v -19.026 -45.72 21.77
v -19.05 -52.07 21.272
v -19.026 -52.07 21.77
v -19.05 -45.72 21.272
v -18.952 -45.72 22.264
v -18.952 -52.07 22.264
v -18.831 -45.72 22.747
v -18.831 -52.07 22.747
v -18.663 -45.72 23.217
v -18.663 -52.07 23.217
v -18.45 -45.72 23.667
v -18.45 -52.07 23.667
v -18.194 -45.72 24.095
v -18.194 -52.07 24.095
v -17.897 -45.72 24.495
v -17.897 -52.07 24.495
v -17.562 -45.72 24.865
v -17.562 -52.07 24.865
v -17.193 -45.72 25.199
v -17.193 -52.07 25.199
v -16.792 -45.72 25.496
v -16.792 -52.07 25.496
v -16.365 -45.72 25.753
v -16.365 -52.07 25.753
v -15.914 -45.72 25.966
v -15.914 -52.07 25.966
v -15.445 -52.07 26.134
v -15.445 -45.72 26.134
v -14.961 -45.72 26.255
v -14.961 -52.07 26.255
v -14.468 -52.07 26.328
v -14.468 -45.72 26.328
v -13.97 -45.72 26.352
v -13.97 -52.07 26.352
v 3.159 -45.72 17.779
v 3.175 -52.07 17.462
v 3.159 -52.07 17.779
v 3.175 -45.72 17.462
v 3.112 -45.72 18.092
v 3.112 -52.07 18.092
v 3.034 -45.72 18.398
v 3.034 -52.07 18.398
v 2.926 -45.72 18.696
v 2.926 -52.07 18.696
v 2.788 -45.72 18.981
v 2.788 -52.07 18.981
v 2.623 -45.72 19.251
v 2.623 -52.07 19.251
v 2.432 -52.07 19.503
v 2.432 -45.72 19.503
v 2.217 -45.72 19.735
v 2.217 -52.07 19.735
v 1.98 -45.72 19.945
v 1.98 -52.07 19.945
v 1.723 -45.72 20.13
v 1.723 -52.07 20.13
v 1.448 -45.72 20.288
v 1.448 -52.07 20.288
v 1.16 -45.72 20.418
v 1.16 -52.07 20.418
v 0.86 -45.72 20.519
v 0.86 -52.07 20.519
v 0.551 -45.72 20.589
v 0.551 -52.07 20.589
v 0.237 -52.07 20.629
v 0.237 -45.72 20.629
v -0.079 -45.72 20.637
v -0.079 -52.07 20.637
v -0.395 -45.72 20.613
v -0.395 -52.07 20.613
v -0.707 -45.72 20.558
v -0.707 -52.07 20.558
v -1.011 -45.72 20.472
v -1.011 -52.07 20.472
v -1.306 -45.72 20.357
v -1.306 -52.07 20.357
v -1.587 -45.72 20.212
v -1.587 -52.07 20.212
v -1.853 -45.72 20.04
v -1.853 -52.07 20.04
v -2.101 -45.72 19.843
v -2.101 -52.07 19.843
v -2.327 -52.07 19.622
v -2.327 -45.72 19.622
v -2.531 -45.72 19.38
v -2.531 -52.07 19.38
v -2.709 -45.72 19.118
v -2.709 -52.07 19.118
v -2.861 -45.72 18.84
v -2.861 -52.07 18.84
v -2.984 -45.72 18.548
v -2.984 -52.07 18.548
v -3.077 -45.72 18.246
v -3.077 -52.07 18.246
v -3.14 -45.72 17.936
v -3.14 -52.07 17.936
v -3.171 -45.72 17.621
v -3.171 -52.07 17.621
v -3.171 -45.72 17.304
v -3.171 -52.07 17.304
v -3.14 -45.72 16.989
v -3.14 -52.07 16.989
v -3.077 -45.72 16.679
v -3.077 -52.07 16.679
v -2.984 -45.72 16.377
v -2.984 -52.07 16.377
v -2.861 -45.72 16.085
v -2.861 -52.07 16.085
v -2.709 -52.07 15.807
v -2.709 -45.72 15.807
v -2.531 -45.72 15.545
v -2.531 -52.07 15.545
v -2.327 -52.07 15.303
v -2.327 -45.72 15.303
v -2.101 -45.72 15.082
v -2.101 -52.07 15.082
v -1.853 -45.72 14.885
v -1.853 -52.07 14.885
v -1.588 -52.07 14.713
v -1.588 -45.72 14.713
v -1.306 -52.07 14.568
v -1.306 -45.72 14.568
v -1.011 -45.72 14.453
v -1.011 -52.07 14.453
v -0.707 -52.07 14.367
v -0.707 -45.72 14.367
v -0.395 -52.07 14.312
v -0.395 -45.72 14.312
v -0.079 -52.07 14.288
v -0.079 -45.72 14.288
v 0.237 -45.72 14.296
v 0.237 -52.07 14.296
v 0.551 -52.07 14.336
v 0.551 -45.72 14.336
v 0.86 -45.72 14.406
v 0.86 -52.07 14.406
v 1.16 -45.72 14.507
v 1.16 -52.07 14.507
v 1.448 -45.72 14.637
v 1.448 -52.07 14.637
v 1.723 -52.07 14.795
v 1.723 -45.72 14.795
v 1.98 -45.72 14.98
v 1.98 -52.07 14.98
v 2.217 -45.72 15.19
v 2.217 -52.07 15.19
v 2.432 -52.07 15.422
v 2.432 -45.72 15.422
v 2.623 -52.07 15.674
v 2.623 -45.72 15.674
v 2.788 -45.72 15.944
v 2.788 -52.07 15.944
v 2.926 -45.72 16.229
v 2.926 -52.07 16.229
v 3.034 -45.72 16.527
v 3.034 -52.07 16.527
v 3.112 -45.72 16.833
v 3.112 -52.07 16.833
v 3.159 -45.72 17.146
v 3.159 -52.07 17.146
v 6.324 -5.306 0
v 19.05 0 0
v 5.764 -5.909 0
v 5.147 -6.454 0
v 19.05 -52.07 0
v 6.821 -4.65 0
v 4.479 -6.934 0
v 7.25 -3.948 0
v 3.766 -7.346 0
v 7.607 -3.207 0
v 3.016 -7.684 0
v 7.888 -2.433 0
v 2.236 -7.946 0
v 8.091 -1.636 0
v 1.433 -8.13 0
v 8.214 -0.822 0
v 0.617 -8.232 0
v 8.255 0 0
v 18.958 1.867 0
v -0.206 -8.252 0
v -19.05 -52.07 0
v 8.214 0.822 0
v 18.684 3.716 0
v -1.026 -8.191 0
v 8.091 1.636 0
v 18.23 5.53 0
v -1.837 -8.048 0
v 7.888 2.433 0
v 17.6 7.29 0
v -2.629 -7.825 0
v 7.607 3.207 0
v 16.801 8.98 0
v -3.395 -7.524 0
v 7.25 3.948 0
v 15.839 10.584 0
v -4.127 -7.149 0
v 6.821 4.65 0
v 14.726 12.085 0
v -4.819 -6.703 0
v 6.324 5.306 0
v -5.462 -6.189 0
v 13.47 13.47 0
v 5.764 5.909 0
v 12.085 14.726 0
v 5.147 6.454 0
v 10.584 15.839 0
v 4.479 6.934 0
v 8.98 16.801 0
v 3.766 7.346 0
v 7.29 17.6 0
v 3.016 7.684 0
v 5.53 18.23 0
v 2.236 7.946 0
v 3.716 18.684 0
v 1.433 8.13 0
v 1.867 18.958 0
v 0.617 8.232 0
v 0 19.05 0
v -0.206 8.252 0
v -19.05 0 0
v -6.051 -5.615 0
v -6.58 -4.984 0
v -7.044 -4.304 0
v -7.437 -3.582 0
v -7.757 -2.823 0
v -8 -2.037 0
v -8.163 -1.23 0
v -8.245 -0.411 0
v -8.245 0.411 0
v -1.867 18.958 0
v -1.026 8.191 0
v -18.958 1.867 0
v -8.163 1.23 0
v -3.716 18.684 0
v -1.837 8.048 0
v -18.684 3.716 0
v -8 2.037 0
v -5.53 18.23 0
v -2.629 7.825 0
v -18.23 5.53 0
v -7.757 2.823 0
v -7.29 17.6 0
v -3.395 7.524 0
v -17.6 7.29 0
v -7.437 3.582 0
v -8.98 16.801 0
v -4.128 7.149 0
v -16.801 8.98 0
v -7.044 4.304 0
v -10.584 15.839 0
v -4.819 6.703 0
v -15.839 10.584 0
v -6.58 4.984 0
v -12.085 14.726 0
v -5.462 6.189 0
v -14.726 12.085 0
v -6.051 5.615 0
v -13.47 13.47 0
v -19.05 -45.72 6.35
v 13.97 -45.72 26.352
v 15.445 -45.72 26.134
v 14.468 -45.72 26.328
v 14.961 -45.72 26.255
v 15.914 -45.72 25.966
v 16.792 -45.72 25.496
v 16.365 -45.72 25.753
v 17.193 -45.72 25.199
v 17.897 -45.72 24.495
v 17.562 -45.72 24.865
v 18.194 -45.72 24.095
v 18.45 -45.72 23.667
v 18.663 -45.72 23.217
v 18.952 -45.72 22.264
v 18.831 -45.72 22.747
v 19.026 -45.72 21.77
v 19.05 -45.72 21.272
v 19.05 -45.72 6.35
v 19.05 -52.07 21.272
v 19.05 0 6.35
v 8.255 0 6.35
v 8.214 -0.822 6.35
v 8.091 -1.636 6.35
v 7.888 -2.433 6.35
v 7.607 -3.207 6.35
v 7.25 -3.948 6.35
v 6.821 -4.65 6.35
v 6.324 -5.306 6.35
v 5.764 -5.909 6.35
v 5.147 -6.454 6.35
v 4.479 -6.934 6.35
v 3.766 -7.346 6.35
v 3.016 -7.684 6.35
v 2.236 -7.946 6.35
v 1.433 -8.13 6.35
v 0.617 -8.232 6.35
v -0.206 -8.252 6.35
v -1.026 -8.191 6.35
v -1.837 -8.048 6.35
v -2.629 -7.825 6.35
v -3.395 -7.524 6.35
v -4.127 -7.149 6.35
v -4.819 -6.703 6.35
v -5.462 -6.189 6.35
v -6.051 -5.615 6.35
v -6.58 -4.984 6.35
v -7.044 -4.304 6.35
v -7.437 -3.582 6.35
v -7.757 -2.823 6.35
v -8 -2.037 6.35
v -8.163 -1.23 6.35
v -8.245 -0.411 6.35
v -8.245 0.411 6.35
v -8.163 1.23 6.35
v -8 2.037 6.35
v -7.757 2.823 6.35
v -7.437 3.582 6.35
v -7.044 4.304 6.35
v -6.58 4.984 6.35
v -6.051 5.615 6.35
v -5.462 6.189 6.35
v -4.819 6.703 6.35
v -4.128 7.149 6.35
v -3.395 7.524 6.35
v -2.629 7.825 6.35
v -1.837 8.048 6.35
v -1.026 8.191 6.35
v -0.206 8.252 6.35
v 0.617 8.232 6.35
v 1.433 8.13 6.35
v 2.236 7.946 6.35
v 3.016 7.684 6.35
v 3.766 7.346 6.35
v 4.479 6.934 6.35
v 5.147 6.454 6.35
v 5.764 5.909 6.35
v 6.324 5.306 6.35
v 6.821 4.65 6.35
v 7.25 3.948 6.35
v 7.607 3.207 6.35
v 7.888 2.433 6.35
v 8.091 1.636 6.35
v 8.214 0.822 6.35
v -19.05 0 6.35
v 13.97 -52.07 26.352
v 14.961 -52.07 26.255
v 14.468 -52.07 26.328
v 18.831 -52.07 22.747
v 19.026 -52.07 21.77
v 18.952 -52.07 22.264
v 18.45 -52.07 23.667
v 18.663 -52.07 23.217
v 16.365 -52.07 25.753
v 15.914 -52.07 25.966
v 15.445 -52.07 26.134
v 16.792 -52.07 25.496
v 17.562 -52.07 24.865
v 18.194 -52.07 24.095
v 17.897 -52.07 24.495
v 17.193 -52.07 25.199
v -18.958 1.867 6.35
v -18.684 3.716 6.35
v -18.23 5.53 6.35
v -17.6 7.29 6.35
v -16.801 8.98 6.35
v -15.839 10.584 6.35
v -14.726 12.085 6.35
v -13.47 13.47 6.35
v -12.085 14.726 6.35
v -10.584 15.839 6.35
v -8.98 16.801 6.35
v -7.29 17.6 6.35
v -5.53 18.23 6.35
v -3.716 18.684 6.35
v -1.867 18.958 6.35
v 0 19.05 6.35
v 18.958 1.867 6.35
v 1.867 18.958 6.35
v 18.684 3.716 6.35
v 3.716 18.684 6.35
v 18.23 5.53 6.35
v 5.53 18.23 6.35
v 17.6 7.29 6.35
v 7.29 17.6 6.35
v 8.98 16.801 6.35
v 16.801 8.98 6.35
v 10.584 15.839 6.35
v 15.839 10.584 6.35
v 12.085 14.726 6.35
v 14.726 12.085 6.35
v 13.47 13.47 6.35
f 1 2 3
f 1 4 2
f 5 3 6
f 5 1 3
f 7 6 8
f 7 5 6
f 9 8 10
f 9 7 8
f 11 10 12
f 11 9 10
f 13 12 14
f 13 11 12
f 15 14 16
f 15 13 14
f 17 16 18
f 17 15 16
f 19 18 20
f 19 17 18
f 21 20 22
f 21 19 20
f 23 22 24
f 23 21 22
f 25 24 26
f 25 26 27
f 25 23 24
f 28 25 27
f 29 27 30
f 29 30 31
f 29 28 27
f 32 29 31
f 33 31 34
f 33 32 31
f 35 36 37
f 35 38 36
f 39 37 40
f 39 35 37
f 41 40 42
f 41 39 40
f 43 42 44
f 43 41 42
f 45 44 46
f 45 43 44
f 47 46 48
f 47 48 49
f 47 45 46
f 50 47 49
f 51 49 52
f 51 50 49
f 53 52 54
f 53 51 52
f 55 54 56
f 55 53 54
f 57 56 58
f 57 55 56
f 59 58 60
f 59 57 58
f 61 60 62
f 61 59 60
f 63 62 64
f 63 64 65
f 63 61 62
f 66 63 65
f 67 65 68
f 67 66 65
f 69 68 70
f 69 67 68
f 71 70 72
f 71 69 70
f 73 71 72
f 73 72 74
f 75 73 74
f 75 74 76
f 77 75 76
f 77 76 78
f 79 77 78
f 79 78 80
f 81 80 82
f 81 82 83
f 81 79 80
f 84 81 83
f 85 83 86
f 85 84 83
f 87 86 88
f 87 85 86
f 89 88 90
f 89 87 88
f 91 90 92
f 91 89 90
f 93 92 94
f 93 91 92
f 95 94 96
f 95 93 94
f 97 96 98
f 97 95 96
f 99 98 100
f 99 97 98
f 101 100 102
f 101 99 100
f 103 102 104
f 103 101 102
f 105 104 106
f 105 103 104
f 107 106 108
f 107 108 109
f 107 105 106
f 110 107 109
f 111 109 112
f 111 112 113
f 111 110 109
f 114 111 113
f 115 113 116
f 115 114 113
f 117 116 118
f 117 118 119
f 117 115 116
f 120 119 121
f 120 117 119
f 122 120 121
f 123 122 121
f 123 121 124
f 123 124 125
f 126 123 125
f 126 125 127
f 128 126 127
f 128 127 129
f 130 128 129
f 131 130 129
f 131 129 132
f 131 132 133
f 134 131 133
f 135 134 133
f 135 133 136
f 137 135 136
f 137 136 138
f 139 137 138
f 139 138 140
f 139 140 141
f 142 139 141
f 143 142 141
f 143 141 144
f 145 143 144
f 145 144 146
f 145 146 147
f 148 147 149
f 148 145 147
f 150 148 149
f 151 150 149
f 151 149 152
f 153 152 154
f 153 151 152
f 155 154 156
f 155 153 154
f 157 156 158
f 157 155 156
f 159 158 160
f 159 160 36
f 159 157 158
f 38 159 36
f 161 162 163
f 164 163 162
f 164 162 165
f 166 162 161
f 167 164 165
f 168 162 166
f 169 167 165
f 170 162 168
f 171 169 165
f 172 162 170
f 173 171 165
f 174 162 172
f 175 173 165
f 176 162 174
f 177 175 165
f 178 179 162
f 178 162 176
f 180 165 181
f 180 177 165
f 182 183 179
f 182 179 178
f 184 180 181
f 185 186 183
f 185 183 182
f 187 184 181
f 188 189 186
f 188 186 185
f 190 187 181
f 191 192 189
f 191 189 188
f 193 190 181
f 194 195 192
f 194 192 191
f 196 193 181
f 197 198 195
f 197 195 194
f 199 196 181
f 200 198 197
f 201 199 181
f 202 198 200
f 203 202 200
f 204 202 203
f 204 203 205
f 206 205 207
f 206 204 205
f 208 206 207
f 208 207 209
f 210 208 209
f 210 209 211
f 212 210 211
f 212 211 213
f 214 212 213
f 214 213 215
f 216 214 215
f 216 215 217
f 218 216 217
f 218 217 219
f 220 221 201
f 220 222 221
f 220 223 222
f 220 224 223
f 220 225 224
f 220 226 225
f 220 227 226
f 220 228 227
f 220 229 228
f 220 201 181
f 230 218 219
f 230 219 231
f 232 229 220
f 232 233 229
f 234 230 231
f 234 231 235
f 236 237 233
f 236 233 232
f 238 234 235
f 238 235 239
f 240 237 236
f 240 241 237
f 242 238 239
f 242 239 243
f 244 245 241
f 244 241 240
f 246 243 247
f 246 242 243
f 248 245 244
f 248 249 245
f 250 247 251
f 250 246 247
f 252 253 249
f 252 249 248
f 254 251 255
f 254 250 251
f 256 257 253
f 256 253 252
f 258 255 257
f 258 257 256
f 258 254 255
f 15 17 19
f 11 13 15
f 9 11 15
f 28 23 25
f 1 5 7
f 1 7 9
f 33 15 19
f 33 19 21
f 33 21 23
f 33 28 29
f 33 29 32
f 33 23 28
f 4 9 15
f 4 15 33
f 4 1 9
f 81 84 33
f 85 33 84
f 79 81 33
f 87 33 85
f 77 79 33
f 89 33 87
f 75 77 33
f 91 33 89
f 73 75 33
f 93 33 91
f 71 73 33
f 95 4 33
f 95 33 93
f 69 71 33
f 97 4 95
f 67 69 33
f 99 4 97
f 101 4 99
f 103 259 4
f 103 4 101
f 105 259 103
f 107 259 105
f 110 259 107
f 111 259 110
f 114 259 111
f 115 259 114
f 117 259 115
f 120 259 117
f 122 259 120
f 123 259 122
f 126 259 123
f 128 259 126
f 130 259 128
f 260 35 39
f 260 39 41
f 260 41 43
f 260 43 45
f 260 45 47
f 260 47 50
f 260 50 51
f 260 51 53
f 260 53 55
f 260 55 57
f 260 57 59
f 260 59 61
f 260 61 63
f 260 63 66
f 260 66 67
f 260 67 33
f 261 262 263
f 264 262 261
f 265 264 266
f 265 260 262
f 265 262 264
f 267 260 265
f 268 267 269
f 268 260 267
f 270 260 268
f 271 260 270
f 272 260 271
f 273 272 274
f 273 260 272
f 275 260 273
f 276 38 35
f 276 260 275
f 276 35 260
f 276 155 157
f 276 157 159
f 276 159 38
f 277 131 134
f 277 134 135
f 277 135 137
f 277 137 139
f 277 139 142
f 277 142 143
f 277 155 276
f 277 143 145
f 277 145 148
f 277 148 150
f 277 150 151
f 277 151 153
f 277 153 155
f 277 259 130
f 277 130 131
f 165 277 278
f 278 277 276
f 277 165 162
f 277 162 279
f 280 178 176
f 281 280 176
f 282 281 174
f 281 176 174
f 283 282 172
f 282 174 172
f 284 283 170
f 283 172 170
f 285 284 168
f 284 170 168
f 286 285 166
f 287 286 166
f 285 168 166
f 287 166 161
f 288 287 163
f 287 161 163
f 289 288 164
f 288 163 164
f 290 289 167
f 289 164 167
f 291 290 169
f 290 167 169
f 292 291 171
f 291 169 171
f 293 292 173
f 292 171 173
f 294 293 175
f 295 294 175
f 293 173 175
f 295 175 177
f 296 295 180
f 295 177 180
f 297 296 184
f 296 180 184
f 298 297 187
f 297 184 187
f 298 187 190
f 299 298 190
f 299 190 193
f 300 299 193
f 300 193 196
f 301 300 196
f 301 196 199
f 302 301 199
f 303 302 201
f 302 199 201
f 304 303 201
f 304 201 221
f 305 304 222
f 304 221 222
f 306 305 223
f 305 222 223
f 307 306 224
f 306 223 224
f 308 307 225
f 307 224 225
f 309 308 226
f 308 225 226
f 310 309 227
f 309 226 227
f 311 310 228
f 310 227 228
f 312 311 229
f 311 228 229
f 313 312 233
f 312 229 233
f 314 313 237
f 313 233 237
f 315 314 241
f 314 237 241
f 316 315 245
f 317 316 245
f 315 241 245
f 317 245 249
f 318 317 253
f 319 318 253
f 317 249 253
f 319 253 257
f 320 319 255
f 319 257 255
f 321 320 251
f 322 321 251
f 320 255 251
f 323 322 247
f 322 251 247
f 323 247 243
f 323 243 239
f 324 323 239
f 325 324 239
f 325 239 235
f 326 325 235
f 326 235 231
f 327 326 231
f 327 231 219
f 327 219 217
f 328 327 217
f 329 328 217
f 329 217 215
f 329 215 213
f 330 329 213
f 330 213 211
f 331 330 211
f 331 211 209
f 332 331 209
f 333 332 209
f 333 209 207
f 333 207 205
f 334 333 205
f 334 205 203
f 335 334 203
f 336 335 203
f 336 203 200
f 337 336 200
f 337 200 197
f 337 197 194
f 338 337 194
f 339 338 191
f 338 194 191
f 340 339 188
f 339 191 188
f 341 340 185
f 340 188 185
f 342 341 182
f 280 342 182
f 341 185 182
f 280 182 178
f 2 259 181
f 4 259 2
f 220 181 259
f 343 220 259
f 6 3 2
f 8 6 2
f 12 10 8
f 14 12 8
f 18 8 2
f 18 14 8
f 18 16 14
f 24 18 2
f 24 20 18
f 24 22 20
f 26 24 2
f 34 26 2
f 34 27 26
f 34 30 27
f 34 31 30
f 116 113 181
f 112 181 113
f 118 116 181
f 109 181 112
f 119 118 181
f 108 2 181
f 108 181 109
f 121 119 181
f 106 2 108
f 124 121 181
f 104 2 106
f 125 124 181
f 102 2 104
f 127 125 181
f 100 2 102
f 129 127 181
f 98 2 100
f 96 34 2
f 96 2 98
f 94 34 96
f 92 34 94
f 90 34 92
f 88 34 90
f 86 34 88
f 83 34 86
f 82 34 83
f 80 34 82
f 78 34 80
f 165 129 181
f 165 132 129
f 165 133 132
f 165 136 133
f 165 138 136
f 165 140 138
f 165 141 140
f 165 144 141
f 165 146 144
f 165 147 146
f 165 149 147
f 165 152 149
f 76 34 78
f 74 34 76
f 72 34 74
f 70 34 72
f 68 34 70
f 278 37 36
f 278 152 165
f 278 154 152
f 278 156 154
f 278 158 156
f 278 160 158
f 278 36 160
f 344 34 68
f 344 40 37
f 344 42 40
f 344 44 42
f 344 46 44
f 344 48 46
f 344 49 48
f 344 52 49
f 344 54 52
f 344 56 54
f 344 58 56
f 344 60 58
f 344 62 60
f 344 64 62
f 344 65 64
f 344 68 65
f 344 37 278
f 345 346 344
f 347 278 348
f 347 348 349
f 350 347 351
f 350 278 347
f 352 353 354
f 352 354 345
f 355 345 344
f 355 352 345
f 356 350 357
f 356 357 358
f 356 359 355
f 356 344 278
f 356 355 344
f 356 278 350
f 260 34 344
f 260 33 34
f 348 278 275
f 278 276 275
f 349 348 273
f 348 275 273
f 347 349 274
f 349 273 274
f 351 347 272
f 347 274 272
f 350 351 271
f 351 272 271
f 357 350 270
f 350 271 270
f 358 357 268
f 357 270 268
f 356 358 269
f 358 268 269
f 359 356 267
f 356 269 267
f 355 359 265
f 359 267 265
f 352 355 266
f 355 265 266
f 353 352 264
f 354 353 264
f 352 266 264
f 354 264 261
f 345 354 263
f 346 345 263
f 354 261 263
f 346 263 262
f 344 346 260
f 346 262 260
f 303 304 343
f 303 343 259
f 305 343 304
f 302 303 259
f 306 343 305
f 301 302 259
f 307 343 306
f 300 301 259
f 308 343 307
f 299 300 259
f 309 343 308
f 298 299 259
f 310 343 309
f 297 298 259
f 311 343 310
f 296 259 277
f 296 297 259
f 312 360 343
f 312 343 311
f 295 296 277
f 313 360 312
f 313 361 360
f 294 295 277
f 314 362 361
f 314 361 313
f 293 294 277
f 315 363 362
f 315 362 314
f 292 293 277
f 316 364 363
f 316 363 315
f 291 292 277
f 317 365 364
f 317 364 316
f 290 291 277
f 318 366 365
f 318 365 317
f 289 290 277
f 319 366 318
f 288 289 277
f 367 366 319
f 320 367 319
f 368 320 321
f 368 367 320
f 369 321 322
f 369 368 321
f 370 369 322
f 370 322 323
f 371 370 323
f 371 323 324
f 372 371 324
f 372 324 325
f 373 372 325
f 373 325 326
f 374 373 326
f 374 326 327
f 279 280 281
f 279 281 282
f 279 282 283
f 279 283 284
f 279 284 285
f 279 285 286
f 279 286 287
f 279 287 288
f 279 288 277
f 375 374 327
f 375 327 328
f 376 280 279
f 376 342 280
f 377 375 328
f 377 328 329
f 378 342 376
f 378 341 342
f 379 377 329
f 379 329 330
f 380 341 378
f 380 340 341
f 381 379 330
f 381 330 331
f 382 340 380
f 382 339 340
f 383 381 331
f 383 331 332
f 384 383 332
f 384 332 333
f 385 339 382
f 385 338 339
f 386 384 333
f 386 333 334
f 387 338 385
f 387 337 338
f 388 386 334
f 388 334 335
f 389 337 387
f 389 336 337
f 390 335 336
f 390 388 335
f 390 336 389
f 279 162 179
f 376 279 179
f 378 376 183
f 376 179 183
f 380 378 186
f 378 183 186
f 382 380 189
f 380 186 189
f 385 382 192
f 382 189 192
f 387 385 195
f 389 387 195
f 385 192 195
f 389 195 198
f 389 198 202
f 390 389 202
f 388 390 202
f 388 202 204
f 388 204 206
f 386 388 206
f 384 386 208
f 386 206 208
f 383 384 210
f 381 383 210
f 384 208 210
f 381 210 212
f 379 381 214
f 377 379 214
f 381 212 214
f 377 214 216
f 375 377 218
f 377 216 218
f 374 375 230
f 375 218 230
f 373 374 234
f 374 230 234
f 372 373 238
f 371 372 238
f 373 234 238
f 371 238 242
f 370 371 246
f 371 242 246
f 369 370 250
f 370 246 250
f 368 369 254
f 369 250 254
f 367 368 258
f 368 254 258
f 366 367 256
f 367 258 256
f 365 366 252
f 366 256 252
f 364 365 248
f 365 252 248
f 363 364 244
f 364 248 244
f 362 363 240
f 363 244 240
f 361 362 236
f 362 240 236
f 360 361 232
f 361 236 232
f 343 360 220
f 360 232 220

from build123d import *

# Parameters (mm, degrees)
BOSS_EXTRUDE1_DEPTH = 6.35
SKETCH2_W           = 38.1
SKETCH2_H           = 41.275
SKETCH2_R           = 3.175
BOSS_EXTRUDE2_DEPTH = 3.175
SKETCH4_W           = 38.1
SKETCH4_H           = 3.175
BOSS_EXTRUDE3_DEPTH = 2.54
SKETCH5_W           = 38.1
SKETCH5_H           = 46.355
BOSS_EXTRUDE4_DEPTH = 3.175
SKETCH6_R           = 3.175
CUT_EXTRUDE1_DEPTH  = 6.35
FILLET1_R           = 5.08
SKETCH7_W           = 70.311291794
SKETCH7_H           = 15.462980338
CUT_EXTRUDE2_DEPTH  = 20.0025


with BuildPart() as part:
    # Sketch1 → Boss-Extrude1 (new body)
    with BuildSketch(Plane.XY):
        with BuildLine():
            ThreePointArc((-8.255, 0), (0, 8.255), (8.255, 0))
            Line((8.255, 0), (19.05, 0))
            ThreePointArc((19.05, 0), (0, 19.05), (-19.05, 0))
            Line((-19.05, 0), (-8.255, 0))
        make_face()
        with BuildLine():
            Line((19.05, 0), (8.255, 0))
            ThreePointArc((8.255, 0), (0, -8.255), (-8.255, 0))
            Line((-8.255, 0), (-19.05, 0))
            ThreePointArc((-19.05, 0), (0, -19.05), (19.05, 0))
        make_face()
        with BuildLine():
            Line((19.05, -45.72), (19.05, 0))
            ThreePointArc((19.05, 0), (0, -19.05), (-19.05, 0))
            Line((-19.05, 0), (-19.05, -45.72))
            Line((-19.05, -45.72), (19.05, -45.72))
        make_face()
    extrude(amount=BOSS_EXTRUDE1_DEPTH)

    # Sketch2 → Boss-Extrude2 (add)
    with BuildSketch(Plane.XZ.offset(45.72)):
        with Locations((0, 3.175)):
            Rectangle(SKETCH2_W, SKETCH2_H)
        with Locations((0, 17.4625)):
            Circle(SKETCH2_R, mode=Mode.SUBTRACT)
        with Locations((0, -11.1125)):
            Circle(SKETCH2_R, mode=Mode.SUBTRACT)
    extrude(amount=BOSS_EXTRUDE2_DEPTH)

    # Sketch4 → Boss-Extrude3 (add)
    with BuildSketch(Plane.XY.offset(23.8125)):
        with Locations((0, -47.3075)):
            Rectangle(SKETCH4_W, SKETCH4_H)
    boss_extrude3 = extrude(amount=BOSS_EXTRUDE3_DEPTH)

    # Mirror1: Boss-Extrude3 across plane
    add(boss_extrude3.mirror(Plane.XY.offset(3.175)))

    # Sketch5 → Boss-Extrude4 (add)
    with BuildSketch(Plane.XZ.offset(48.895)):
        with Locations((0, 3.175)):
            Rectangle(SKETCH5_W, SKETCH5_H)
    extrude(amount=BOSS_EXTRUDE4_DEPTH)

    # Sketch6 → Cut-Extrude1 (cut)
    with BuildSketch(Plane(origin=(0, -45.72, 0), x_dir=(1, 0, 0), z_dir=(0, 1, 0))):
        with Locations((0, 11.1125)):
            Circle(SKETCH6_R)
    cut_extrude1 = extrude(amount=-CUT_EXTRUDE1_DEPTH, mode=Mode.SUBTRACT)

    # Mirror2: Cut-Extrude1 across plane
    add(cut_extrude1.mirror(Plane.XY.offset(3.175)), mode=Mode.SUBTRACT)

    # Fillet1
    fillet1_edges = [part.edges().sort_by_distance(p)[0] for p in [
        (19.05, -48.895, 26.3525),
        (-19.05, -48.895, 26.3525),
        (-19.05, -48.895, -20.0025),
        (19.05, -48.895, -20.0025),
    ]]
    fillet(fillet1_edges, radius=FILLET1_R)

    # Sketch7 → Cut-Extrude2 (cut)
    with BuildSketch(Plane(origin=(0, 0, -20.0025), x_dir=(-1, 0, 0), z_dir=(0, 0, -1))):
        with Locations((-1.046028379, -47.628881587)):
            Rectangle(SKETCH7_W, SKETCH7_H)
    extrude(amount=-CUT_EXTRUDE2_DEPTH, mode=Mode.SUBTRACT)


solid = part.part
